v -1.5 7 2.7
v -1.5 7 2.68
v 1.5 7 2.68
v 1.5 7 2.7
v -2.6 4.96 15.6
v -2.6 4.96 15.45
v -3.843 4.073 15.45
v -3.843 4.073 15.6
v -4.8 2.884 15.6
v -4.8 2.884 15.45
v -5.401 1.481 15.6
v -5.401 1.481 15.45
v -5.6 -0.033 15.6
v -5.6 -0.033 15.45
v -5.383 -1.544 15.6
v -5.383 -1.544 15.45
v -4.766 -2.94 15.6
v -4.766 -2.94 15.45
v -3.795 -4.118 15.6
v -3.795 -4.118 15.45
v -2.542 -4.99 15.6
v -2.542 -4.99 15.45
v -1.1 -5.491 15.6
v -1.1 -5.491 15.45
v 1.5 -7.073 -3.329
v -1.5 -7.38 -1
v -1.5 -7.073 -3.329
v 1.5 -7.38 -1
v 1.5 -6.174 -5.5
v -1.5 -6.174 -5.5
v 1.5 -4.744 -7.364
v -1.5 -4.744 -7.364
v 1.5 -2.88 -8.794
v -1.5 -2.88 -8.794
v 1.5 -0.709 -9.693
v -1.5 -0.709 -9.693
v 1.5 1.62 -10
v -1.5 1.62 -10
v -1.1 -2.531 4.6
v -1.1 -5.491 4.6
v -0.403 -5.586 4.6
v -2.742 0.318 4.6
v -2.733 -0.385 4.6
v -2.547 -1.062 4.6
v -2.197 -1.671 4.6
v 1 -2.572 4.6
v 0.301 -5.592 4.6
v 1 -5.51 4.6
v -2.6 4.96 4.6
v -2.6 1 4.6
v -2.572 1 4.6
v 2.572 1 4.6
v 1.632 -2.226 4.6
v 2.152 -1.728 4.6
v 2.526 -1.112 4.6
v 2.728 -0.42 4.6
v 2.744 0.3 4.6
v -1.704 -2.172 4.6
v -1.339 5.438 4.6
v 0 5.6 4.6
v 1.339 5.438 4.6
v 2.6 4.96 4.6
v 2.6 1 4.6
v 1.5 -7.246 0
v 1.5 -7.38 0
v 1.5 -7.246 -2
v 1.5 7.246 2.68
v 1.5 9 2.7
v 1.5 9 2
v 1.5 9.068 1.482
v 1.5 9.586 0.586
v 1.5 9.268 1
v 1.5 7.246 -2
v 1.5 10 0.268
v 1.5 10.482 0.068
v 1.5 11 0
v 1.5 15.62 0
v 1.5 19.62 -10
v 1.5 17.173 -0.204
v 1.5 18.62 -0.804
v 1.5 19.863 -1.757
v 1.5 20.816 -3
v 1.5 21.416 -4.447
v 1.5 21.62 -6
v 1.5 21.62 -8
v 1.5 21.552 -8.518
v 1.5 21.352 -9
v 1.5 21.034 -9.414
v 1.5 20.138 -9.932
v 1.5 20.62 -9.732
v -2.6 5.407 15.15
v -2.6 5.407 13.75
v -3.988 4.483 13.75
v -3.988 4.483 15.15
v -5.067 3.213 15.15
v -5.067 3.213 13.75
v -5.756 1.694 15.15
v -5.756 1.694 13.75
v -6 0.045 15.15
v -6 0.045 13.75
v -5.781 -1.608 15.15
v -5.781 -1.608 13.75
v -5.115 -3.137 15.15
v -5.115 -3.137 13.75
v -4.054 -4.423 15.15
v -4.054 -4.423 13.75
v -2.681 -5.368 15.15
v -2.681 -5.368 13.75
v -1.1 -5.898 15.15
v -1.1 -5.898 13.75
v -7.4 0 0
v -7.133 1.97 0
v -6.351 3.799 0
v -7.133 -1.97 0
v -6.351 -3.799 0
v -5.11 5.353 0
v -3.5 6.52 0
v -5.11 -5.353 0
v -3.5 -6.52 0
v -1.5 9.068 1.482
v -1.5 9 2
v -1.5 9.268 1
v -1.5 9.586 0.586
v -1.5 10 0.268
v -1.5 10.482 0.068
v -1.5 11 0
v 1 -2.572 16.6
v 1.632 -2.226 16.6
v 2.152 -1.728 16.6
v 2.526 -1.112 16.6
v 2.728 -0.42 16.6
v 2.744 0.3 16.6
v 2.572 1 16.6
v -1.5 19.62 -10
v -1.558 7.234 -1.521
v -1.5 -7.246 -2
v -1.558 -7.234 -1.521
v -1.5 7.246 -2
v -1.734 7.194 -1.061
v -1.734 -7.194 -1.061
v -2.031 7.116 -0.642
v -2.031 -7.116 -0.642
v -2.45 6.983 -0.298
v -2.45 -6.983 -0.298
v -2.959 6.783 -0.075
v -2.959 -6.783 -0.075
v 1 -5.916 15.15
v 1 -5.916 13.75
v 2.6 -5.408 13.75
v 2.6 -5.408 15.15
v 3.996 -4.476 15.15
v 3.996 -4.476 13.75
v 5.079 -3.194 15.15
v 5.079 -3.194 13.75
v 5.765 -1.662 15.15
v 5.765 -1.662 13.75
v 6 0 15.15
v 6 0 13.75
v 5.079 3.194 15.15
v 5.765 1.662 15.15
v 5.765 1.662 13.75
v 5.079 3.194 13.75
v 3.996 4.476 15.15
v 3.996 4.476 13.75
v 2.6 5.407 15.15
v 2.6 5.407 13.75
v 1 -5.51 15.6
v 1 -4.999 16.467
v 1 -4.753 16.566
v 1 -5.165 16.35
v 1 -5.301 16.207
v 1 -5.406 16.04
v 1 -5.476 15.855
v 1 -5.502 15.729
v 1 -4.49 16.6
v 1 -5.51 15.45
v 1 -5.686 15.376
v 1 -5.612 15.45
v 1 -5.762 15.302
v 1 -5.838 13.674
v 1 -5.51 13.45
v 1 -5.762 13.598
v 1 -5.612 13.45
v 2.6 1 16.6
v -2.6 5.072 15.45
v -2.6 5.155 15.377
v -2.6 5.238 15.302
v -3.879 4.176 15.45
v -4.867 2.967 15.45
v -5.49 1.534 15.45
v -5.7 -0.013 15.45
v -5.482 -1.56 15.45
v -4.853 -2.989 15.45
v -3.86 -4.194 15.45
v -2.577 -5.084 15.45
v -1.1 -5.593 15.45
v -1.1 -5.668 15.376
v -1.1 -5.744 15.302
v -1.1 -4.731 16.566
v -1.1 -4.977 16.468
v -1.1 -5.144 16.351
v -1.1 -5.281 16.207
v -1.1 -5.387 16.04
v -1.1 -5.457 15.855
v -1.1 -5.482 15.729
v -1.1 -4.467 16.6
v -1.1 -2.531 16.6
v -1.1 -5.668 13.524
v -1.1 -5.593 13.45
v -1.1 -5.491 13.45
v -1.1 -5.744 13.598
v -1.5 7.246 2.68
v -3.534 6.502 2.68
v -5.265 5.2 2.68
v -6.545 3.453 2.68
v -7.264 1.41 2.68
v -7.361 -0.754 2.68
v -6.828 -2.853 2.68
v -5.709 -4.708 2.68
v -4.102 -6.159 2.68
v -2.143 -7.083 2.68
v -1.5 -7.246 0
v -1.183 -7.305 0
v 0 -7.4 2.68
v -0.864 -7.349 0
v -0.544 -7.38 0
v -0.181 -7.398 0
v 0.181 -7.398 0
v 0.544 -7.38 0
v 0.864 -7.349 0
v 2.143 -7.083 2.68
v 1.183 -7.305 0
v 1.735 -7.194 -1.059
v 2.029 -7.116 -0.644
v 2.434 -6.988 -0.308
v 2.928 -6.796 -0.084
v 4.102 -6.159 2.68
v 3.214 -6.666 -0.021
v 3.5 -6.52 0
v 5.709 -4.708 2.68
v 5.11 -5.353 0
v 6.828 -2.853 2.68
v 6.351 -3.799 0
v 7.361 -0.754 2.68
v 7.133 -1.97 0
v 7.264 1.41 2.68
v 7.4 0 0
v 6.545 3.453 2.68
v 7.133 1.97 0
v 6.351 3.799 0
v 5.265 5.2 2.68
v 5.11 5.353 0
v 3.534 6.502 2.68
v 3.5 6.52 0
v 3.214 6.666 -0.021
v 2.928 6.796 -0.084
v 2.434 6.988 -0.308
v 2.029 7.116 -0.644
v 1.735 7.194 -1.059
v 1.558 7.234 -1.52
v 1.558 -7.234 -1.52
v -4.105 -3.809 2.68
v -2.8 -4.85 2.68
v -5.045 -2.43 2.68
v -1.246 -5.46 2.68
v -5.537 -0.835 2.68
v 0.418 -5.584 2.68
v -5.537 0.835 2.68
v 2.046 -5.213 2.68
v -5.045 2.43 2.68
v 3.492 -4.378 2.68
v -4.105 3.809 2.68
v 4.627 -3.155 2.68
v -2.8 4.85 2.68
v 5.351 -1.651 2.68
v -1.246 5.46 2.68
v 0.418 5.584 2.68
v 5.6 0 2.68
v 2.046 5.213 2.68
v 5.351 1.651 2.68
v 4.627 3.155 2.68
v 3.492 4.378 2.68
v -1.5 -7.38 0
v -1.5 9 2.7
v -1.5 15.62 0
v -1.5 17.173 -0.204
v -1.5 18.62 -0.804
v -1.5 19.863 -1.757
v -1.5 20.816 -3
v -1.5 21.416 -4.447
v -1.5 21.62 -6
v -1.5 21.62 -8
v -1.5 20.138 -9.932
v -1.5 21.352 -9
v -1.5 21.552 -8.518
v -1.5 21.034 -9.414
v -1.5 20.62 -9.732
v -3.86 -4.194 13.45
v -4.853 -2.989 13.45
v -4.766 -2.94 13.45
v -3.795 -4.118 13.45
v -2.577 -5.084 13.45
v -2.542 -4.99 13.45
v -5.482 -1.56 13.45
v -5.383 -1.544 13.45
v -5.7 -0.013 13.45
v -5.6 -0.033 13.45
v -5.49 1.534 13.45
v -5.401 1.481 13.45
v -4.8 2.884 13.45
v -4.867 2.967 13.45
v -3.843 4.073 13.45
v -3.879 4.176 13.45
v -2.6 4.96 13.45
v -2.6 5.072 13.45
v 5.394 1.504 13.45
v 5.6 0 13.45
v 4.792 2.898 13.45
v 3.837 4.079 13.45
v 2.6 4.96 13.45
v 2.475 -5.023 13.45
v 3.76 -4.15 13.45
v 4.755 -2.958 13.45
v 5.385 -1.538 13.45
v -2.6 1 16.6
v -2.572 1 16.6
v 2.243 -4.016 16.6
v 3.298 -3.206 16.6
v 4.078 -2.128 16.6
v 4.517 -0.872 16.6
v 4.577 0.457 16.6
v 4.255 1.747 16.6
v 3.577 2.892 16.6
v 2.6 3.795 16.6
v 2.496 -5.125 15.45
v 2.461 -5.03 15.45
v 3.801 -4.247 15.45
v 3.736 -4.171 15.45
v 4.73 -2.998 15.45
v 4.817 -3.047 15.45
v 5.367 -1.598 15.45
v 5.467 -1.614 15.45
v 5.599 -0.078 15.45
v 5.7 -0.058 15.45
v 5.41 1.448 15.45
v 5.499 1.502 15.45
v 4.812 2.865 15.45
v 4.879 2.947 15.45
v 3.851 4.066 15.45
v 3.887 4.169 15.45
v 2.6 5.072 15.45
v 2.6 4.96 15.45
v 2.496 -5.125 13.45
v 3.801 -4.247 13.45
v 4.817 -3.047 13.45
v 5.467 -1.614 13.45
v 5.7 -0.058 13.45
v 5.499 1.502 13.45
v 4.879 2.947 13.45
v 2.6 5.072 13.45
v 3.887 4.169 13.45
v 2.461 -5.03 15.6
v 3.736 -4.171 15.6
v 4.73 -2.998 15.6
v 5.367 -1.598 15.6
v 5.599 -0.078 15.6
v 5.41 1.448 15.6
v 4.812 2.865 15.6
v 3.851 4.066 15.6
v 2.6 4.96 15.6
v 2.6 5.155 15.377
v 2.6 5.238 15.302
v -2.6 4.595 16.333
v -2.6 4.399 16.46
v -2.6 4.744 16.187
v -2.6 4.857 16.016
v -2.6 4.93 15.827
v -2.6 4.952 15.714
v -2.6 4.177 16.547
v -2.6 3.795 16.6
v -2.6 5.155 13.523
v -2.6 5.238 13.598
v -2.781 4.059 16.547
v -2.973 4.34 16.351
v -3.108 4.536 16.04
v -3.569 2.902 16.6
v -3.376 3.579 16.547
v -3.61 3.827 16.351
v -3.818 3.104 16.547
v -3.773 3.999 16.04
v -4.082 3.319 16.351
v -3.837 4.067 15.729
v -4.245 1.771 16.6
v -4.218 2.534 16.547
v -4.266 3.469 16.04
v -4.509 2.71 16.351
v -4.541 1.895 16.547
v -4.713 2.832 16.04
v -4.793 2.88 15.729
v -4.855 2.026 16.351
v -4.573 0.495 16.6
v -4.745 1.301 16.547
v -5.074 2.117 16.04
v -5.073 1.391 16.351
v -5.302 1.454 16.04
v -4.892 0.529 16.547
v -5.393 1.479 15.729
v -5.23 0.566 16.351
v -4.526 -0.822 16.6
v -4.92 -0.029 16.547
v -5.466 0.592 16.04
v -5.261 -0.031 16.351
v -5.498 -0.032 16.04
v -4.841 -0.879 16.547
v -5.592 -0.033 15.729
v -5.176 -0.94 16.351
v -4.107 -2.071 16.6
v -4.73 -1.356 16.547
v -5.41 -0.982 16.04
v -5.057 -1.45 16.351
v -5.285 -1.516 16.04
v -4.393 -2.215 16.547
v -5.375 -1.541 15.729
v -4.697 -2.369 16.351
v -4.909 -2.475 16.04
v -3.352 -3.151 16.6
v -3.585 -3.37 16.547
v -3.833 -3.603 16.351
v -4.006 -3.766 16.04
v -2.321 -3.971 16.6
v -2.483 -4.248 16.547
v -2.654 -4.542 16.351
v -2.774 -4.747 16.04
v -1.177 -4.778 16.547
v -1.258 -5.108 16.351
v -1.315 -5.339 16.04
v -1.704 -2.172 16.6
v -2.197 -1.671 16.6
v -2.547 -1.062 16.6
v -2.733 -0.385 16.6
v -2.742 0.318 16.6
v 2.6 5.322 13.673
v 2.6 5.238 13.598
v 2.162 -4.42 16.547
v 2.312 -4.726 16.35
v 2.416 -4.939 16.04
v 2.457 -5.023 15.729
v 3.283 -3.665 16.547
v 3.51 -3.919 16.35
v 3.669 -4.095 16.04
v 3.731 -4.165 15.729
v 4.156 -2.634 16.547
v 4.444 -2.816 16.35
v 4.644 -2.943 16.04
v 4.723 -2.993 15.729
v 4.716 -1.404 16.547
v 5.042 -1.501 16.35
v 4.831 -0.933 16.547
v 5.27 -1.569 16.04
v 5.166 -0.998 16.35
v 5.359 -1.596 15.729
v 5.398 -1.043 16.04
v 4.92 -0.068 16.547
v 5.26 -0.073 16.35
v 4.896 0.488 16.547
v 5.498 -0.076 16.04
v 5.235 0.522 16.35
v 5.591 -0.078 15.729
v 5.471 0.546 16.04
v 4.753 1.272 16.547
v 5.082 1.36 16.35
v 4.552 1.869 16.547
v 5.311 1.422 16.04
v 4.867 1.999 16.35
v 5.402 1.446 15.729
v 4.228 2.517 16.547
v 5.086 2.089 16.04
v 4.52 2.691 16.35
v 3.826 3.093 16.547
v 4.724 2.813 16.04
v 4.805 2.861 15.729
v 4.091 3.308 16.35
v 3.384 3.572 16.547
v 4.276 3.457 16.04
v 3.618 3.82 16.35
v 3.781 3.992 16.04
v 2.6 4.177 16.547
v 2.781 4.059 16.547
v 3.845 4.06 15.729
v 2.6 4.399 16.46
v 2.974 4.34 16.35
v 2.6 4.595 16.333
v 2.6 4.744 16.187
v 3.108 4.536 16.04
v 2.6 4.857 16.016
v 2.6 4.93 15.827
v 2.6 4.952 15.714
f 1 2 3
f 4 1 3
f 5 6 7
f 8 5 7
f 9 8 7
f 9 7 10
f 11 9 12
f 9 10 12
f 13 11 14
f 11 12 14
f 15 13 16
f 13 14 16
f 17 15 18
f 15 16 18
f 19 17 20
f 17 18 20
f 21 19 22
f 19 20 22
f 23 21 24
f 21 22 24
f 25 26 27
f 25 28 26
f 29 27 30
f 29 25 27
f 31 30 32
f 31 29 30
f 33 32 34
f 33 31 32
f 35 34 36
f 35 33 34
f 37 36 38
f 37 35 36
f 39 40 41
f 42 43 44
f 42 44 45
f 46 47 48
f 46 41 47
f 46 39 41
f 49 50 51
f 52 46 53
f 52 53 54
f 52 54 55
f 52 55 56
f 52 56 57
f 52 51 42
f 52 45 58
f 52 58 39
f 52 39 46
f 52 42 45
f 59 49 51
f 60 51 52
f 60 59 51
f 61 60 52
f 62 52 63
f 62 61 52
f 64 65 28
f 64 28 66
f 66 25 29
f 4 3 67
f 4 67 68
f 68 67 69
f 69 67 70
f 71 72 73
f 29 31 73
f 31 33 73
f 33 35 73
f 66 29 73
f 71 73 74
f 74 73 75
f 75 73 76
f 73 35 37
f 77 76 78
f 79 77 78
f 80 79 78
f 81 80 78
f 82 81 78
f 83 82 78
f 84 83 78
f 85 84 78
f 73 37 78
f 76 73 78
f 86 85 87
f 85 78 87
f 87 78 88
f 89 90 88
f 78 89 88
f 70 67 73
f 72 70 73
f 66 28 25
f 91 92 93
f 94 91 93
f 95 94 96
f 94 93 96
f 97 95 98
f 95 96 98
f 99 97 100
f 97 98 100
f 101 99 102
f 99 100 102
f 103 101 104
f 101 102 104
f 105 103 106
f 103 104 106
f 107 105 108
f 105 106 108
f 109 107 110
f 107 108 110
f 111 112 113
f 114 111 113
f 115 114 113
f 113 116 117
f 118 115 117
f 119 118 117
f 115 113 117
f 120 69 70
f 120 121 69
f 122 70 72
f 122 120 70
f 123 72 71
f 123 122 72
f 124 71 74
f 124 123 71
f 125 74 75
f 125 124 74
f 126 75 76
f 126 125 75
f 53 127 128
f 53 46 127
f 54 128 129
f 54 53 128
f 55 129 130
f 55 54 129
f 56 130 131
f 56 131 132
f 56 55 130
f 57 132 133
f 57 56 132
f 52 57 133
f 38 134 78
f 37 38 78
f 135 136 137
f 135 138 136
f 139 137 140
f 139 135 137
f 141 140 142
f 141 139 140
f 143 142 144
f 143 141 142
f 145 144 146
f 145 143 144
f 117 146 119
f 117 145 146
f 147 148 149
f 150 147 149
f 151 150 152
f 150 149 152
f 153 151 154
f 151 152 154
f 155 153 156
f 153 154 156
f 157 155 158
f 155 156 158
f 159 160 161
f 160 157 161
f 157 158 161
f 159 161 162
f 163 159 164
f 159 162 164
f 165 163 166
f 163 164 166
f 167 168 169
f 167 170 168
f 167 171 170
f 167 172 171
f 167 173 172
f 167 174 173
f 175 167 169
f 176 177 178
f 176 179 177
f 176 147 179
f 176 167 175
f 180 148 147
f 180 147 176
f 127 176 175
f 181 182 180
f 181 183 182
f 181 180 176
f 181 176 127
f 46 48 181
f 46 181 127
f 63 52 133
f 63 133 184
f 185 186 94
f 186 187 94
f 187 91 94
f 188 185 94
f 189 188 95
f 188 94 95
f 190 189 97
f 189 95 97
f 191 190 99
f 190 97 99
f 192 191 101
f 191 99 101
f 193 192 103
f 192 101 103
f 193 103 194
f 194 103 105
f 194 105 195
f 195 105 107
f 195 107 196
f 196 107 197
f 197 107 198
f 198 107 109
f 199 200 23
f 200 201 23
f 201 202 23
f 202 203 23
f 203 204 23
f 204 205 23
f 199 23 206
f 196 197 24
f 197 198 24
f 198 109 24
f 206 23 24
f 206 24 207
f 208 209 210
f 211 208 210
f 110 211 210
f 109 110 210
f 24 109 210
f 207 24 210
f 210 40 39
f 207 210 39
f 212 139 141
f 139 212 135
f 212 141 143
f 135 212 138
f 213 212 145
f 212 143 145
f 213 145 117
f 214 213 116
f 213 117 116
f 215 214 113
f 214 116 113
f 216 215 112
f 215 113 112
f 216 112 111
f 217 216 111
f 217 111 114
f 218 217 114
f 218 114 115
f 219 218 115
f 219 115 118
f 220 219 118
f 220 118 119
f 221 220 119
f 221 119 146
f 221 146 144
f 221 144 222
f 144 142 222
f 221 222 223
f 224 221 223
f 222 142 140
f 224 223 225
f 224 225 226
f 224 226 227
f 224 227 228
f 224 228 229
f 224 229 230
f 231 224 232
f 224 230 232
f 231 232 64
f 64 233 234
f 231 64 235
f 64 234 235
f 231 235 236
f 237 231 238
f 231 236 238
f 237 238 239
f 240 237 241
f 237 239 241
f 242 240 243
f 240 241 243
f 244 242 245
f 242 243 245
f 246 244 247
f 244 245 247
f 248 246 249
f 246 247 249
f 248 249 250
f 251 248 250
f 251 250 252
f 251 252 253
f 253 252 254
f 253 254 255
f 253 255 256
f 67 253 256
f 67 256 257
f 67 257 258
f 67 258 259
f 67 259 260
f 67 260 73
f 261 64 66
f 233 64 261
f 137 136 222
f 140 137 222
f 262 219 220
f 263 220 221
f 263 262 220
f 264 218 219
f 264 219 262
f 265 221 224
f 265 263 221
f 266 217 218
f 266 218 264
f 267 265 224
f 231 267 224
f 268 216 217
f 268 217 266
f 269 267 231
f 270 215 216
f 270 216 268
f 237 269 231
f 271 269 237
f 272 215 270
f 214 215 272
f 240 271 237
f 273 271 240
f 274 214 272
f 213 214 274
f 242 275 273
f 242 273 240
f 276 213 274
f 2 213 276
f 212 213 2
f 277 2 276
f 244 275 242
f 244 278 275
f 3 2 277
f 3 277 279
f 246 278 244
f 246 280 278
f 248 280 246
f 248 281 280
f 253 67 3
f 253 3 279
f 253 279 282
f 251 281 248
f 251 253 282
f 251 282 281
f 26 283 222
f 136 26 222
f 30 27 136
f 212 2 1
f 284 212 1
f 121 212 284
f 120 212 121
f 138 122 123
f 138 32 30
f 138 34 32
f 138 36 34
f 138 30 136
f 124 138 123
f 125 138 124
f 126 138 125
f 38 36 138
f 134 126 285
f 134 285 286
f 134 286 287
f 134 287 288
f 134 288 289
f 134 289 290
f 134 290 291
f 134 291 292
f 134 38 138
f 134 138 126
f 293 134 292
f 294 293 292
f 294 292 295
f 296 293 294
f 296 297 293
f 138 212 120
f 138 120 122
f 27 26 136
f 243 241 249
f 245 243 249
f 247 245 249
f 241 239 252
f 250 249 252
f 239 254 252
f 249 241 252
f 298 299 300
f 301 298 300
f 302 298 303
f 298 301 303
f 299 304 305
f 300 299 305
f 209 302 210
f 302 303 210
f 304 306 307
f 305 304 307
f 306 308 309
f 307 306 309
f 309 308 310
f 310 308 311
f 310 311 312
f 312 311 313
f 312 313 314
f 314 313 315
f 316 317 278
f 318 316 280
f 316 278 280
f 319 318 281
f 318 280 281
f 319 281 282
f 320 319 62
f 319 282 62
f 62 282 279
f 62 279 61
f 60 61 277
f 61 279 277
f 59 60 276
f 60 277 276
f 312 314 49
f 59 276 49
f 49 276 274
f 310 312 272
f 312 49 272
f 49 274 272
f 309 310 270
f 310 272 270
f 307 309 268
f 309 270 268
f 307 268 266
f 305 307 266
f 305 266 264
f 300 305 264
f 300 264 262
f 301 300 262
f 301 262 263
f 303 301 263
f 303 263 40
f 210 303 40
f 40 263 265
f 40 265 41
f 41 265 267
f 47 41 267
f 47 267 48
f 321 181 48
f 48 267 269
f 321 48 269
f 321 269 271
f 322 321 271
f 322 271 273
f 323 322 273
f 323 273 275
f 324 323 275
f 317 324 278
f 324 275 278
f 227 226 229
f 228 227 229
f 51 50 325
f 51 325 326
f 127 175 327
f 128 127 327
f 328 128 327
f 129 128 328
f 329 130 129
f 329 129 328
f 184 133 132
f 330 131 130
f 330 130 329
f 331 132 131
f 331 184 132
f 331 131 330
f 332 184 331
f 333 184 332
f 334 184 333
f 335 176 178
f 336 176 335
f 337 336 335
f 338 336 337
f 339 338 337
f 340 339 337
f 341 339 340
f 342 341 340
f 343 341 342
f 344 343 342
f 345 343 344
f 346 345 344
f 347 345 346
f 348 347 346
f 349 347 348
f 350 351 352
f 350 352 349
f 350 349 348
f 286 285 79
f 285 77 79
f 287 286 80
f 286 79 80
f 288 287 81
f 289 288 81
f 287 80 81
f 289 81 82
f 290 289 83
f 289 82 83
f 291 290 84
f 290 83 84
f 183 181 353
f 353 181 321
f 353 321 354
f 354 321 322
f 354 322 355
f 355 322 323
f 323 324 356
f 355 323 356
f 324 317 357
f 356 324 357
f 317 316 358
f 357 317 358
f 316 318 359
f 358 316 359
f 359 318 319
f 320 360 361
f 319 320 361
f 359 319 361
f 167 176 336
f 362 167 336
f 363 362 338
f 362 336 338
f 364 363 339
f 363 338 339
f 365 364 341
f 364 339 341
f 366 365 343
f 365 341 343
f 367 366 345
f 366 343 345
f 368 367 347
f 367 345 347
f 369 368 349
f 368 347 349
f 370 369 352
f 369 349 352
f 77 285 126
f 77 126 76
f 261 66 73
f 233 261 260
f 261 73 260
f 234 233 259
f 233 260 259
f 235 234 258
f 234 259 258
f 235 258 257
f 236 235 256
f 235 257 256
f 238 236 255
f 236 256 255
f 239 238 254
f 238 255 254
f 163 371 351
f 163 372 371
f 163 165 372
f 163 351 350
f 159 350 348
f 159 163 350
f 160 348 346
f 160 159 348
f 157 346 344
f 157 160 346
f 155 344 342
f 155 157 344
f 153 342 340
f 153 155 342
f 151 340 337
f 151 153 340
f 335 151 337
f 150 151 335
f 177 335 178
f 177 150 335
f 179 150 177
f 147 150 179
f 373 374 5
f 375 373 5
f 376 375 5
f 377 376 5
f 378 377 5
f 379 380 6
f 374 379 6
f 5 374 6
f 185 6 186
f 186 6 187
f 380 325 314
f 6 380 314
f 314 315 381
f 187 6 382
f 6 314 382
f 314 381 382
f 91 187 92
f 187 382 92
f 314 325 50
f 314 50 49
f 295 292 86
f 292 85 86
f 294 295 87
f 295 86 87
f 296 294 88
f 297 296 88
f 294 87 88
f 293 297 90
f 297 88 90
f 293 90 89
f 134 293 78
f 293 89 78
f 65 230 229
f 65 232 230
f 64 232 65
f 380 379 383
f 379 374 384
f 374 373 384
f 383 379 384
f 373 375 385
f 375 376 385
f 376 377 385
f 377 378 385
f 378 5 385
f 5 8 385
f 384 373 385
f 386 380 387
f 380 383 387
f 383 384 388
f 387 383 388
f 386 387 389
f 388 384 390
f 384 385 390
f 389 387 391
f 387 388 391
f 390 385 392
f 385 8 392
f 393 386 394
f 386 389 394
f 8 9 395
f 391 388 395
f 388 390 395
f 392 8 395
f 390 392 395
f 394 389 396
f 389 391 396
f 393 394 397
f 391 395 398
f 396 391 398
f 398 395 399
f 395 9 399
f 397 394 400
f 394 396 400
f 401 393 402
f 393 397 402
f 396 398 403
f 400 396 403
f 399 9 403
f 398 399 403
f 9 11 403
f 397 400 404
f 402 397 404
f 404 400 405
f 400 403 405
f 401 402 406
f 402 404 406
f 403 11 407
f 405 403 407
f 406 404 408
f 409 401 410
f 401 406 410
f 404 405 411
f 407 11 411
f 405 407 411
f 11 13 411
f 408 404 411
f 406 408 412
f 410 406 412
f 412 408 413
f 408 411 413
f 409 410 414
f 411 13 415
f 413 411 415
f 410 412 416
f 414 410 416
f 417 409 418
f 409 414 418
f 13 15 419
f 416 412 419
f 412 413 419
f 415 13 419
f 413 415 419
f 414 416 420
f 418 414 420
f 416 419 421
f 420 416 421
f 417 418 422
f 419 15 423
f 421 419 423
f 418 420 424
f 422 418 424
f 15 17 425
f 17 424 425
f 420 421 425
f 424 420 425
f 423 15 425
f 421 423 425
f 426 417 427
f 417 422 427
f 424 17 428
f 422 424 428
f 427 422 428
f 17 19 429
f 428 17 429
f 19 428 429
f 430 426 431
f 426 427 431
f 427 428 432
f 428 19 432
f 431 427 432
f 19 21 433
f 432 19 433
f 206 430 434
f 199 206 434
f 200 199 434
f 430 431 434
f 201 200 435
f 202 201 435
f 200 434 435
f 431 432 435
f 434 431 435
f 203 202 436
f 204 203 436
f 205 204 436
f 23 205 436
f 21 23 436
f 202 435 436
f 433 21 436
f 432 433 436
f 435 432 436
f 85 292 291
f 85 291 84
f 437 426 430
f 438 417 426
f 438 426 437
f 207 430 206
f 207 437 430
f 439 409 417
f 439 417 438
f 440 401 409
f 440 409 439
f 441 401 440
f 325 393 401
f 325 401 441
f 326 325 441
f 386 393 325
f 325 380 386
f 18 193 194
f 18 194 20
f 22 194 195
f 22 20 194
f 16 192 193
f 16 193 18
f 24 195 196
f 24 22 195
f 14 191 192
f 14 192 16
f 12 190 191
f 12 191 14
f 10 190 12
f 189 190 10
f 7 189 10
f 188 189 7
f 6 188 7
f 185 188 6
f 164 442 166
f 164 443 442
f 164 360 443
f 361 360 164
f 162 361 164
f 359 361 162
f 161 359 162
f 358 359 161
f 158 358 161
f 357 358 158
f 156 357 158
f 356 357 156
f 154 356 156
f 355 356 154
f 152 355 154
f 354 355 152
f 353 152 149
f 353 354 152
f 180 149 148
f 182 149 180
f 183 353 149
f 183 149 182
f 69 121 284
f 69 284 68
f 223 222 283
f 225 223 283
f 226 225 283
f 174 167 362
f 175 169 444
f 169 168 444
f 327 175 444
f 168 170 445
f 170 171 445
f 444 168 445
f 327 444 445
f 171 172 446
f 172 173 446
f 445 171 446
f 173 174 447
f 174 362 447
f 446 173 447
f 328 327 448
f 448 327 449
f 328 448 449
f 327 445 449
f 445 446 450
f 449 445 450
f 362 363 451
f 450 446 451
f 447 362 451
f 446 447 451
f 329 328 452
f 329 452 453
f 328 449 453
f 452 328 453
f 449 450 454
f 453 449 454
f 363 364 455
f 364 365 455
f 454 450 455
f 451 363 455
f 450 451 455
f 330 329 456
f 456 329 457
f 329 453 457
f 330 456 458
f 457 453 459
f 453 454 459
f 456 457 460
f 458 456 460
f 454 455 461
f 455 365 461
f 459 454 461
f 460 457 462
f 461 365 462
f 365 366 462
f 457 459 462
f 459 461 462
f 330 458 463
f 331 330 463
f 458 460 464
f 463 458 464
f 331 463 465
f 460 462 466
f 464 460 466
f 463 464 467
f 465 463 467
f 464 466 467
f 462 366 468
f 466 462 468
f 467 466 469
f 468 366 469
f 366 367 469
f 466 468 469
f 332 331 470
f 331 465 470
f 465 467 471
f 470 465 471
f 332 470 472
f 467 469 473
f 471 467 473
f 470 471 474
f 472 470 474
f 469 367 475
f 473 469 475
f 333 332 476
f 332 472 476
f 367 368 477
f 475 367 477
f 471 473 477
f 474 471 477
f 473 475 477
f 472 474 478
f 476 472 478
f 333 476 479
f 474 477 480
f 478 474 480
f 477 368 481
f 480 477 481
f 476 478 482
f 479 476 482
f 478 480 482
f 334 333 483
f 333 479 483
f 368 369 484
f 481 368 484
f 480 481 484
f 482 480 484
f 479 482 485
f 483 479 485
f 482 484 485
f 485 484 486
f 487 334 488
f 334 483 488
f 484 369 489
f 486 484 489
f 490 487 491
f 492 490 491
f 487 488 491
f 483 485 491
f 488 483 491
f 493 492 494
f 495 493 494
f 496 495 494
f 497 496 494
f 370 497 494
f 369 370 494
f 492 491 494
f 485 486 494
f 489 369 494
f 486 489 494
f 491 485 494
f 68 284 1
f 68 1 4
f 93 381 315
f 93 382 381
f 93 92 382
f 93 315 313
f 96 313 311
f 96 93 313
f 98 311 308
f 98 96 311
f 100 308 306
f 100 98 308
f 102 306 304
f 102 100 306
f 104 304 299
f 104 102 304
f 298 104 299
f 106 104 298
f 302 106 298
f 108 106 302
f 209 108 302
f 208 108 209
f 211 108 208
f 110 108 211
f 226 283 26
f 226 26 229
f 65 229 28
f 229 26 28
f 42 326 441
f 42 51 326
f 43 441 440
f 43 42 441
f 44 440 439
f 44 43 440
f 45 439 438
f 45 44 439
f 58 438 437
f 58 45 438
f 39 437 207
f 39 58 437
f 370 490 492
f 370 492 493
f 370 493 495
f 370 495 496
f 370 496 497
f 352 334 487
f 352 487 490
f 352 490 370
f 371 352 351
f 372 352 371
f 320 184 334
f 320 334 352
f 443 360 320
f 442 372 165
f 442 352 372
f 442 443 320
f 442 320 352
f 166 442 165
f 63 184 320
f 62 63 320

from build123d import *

# Parameters (mm, degrees)
BOX_W             = 5.2
BOX_H             = 5
BOX_DEPTH         = 13
BOX003_W          = 2.1
BOX003_H          = 5
BOX003_DEPTH      = 13
CYLINDER003_R     = 2.76
CYLINDER003_DEPTH = 13.6
CYLINDER002_R     = 6
CYLINDER002_DEPTH = 2
CYLINDER001_R     = 7.4
CYLINDER001_DEPTH = 2.68
CYLINDER_R        = 5.6
CYLINDER_DEPTH    = 16.6
BOX002_W          = 3
BOX002_H          = 2
BOX002_DEPTH      = 4
BOX001_W          = 3
BOX001_H          = 29
BOX001_DEPTH      = 10
FILLET_1_R        = 9
FILLET_2_R        = 6
FILLET_3_R        = 2
FILLET001_R       = 2
FILLET002_R       = 2
FILLET003_R       = 1
CHAMFER_SIZE      = 0.3


with BuildPart() as box:
    # Box → Box (new body)
    with BuildSketch(Plane(origin=(-2.6, 1, 4.6), x_dir=(1, 0, 0), z_dir=(0, 0, 1))):
        with Locations((2.6, 2.5)):
            Rectangle(BOX_W, BOX_H)
    extrude(amount=BOX_DEPTH)


with BuildPart() as box003:
    # Box003 → Box003 (new body)
    with BuildSketch(Plane(origin=(-1.1, -7, 4.6), x_dir=(1, 0, 0), z_dir=(0, 0, 1))):
        with Locations((1.05, 2.5)):
            Rectangle(BOX003_W, BOX003_H)
    extrude(amount=BOX003_DEPTH)


with BuildPart() as fusion001:
    # Cylinder003 → Cylinder003 (new body)
    with BuildSketch(Plane.XY.offset(4.6)):
        Circle(CYLINDER003_R)
    extrude(amount=CYLINDER003_DEPTH)

    # Fusion001: union Box, Box003
    add(box.part)
    add(box003.part)


with BuildPart() as cylinder002:
    # Cylinder002 → Cylinder002 (new body)
    with BuildSketch(Plane.XY.offset(13.45)):
        Circle(CYLINDER002_R)
    extrude(amount=CYLINDER002_DEPTH)


with BuildPart() as base:
    # Cylinder001 → Cylinder001 (new body)
    with BuildSketch(Plane.XY):
        Circle(CYLINDER001_R)
    extrude(amount=CYLINDER001_DEPTH)


with BuildPart() as cut:
    # Cylinder → Cylinder (new body)
    with BuildSketch(Plane.XY):
        Circle(CYLINDER_R)
    extrude(amount=CYLINDER_DEPTH)

    # Fusion: union Cylinder002, base
    add(cylinder002.part)
    add(base.part)

    # Cut: cut Fusion001
    add(fusion001.part, mode=Mode.SUBTRACT)


with BuildPart() as union_palometa:
    # Box002 → Box002 (new body)
    with BuildSketch(Plane(origin=(-1.5, 7, -1.3), x_dir=(1, 0, 0), z_dir=(0, 0, 1))):
        with Locations((1.5, 1)):
            Rectangle(BOX002_W, BOX002_H)
    extrude(amount=BOX002_DEPTH)


with BuildPart() as chamfer_body:
    # Box001 → Box001 (new body)
    with BuildSketch(Plane(origin=(-1.5, -7.38, -10), x_dir=(1, 0, 0), z_dir=(0, 0, 1))):
        with Locations((1.5, 14.5)):
            Rectangle(BOX001_W, BOX001_H)
    extrude(amount=BOX001_DEPTH)

    # Fillet 1
    fillet_1_edges = [chamfer_body.edges().sort_by_distance(p)[0] for p in [
        (0, -7.38, -10),
    ]]
    fillet(fillet_1_edges, radius=FILLET_1_R)

    # Fillet 2
    fillet_2_edges = [chamfer_body.edges().sort_by_distance(p)[0] for p in [
        (0, 21.62, 0),
    ]]
    fillet(fillet_2_edges, radius=FILLET_2_R)

    # Fillet 3
    fillet_3_edges = [chamfer_body.edges().sort_by_distance(p)[0] for p in [
        (0, 21.62, -10),
    ]]
    fillet(fillet_3_edges, radius=FILLET_3_R)

    # Fusion002: union union palometa
    add(union_palometa.part)

    # Fillet001
    fillet001_edges = [chamfer_body.edges().sort_by_distance(p)[0] for p in [
        (0, 9, 0),
    ]]
    fillet(fillet001_edges, radius=FILLET001_R)

    # Fusion003: union Cut
    add(cut.part)

    # Fillet002
    fillet002_edges = [chamfer_body.edges().sort_by_distance(p)[0] for p in [
        (1.5, 0, 0),
        (-1.5, 0, 0),
    ]]
    fillet(fillet002_edges, radius=FILLET002_R)

    # Fillet003
    fillet003_edges = [chamfer_body.edges().sort_by_distance(p)[0] for p in [
        (4.298837, -3.588872, 16.6),
        (4.791659, 2.898275, 16.6),
        (-5.543193, -0.795617, 16.6),
    ]]
    fillet(fillet003_edges, radius=FILLET003_R)

    # Chamfer
    chamfer_edges = [chamfer_body.edges().sort_by_distance(p)[0] for p in [
        (4.582576, -3.872983, 15.45),
        (4.582576, -3.872983, 13.45),
        (-5.947878, -0.789143, 13.45),
        (-5.947878, -0.789143, 15.45),
    ]]
    chamfer(chamfer_edges, length=CHAMFER_SIZE)


solid = chamfer_body.part
